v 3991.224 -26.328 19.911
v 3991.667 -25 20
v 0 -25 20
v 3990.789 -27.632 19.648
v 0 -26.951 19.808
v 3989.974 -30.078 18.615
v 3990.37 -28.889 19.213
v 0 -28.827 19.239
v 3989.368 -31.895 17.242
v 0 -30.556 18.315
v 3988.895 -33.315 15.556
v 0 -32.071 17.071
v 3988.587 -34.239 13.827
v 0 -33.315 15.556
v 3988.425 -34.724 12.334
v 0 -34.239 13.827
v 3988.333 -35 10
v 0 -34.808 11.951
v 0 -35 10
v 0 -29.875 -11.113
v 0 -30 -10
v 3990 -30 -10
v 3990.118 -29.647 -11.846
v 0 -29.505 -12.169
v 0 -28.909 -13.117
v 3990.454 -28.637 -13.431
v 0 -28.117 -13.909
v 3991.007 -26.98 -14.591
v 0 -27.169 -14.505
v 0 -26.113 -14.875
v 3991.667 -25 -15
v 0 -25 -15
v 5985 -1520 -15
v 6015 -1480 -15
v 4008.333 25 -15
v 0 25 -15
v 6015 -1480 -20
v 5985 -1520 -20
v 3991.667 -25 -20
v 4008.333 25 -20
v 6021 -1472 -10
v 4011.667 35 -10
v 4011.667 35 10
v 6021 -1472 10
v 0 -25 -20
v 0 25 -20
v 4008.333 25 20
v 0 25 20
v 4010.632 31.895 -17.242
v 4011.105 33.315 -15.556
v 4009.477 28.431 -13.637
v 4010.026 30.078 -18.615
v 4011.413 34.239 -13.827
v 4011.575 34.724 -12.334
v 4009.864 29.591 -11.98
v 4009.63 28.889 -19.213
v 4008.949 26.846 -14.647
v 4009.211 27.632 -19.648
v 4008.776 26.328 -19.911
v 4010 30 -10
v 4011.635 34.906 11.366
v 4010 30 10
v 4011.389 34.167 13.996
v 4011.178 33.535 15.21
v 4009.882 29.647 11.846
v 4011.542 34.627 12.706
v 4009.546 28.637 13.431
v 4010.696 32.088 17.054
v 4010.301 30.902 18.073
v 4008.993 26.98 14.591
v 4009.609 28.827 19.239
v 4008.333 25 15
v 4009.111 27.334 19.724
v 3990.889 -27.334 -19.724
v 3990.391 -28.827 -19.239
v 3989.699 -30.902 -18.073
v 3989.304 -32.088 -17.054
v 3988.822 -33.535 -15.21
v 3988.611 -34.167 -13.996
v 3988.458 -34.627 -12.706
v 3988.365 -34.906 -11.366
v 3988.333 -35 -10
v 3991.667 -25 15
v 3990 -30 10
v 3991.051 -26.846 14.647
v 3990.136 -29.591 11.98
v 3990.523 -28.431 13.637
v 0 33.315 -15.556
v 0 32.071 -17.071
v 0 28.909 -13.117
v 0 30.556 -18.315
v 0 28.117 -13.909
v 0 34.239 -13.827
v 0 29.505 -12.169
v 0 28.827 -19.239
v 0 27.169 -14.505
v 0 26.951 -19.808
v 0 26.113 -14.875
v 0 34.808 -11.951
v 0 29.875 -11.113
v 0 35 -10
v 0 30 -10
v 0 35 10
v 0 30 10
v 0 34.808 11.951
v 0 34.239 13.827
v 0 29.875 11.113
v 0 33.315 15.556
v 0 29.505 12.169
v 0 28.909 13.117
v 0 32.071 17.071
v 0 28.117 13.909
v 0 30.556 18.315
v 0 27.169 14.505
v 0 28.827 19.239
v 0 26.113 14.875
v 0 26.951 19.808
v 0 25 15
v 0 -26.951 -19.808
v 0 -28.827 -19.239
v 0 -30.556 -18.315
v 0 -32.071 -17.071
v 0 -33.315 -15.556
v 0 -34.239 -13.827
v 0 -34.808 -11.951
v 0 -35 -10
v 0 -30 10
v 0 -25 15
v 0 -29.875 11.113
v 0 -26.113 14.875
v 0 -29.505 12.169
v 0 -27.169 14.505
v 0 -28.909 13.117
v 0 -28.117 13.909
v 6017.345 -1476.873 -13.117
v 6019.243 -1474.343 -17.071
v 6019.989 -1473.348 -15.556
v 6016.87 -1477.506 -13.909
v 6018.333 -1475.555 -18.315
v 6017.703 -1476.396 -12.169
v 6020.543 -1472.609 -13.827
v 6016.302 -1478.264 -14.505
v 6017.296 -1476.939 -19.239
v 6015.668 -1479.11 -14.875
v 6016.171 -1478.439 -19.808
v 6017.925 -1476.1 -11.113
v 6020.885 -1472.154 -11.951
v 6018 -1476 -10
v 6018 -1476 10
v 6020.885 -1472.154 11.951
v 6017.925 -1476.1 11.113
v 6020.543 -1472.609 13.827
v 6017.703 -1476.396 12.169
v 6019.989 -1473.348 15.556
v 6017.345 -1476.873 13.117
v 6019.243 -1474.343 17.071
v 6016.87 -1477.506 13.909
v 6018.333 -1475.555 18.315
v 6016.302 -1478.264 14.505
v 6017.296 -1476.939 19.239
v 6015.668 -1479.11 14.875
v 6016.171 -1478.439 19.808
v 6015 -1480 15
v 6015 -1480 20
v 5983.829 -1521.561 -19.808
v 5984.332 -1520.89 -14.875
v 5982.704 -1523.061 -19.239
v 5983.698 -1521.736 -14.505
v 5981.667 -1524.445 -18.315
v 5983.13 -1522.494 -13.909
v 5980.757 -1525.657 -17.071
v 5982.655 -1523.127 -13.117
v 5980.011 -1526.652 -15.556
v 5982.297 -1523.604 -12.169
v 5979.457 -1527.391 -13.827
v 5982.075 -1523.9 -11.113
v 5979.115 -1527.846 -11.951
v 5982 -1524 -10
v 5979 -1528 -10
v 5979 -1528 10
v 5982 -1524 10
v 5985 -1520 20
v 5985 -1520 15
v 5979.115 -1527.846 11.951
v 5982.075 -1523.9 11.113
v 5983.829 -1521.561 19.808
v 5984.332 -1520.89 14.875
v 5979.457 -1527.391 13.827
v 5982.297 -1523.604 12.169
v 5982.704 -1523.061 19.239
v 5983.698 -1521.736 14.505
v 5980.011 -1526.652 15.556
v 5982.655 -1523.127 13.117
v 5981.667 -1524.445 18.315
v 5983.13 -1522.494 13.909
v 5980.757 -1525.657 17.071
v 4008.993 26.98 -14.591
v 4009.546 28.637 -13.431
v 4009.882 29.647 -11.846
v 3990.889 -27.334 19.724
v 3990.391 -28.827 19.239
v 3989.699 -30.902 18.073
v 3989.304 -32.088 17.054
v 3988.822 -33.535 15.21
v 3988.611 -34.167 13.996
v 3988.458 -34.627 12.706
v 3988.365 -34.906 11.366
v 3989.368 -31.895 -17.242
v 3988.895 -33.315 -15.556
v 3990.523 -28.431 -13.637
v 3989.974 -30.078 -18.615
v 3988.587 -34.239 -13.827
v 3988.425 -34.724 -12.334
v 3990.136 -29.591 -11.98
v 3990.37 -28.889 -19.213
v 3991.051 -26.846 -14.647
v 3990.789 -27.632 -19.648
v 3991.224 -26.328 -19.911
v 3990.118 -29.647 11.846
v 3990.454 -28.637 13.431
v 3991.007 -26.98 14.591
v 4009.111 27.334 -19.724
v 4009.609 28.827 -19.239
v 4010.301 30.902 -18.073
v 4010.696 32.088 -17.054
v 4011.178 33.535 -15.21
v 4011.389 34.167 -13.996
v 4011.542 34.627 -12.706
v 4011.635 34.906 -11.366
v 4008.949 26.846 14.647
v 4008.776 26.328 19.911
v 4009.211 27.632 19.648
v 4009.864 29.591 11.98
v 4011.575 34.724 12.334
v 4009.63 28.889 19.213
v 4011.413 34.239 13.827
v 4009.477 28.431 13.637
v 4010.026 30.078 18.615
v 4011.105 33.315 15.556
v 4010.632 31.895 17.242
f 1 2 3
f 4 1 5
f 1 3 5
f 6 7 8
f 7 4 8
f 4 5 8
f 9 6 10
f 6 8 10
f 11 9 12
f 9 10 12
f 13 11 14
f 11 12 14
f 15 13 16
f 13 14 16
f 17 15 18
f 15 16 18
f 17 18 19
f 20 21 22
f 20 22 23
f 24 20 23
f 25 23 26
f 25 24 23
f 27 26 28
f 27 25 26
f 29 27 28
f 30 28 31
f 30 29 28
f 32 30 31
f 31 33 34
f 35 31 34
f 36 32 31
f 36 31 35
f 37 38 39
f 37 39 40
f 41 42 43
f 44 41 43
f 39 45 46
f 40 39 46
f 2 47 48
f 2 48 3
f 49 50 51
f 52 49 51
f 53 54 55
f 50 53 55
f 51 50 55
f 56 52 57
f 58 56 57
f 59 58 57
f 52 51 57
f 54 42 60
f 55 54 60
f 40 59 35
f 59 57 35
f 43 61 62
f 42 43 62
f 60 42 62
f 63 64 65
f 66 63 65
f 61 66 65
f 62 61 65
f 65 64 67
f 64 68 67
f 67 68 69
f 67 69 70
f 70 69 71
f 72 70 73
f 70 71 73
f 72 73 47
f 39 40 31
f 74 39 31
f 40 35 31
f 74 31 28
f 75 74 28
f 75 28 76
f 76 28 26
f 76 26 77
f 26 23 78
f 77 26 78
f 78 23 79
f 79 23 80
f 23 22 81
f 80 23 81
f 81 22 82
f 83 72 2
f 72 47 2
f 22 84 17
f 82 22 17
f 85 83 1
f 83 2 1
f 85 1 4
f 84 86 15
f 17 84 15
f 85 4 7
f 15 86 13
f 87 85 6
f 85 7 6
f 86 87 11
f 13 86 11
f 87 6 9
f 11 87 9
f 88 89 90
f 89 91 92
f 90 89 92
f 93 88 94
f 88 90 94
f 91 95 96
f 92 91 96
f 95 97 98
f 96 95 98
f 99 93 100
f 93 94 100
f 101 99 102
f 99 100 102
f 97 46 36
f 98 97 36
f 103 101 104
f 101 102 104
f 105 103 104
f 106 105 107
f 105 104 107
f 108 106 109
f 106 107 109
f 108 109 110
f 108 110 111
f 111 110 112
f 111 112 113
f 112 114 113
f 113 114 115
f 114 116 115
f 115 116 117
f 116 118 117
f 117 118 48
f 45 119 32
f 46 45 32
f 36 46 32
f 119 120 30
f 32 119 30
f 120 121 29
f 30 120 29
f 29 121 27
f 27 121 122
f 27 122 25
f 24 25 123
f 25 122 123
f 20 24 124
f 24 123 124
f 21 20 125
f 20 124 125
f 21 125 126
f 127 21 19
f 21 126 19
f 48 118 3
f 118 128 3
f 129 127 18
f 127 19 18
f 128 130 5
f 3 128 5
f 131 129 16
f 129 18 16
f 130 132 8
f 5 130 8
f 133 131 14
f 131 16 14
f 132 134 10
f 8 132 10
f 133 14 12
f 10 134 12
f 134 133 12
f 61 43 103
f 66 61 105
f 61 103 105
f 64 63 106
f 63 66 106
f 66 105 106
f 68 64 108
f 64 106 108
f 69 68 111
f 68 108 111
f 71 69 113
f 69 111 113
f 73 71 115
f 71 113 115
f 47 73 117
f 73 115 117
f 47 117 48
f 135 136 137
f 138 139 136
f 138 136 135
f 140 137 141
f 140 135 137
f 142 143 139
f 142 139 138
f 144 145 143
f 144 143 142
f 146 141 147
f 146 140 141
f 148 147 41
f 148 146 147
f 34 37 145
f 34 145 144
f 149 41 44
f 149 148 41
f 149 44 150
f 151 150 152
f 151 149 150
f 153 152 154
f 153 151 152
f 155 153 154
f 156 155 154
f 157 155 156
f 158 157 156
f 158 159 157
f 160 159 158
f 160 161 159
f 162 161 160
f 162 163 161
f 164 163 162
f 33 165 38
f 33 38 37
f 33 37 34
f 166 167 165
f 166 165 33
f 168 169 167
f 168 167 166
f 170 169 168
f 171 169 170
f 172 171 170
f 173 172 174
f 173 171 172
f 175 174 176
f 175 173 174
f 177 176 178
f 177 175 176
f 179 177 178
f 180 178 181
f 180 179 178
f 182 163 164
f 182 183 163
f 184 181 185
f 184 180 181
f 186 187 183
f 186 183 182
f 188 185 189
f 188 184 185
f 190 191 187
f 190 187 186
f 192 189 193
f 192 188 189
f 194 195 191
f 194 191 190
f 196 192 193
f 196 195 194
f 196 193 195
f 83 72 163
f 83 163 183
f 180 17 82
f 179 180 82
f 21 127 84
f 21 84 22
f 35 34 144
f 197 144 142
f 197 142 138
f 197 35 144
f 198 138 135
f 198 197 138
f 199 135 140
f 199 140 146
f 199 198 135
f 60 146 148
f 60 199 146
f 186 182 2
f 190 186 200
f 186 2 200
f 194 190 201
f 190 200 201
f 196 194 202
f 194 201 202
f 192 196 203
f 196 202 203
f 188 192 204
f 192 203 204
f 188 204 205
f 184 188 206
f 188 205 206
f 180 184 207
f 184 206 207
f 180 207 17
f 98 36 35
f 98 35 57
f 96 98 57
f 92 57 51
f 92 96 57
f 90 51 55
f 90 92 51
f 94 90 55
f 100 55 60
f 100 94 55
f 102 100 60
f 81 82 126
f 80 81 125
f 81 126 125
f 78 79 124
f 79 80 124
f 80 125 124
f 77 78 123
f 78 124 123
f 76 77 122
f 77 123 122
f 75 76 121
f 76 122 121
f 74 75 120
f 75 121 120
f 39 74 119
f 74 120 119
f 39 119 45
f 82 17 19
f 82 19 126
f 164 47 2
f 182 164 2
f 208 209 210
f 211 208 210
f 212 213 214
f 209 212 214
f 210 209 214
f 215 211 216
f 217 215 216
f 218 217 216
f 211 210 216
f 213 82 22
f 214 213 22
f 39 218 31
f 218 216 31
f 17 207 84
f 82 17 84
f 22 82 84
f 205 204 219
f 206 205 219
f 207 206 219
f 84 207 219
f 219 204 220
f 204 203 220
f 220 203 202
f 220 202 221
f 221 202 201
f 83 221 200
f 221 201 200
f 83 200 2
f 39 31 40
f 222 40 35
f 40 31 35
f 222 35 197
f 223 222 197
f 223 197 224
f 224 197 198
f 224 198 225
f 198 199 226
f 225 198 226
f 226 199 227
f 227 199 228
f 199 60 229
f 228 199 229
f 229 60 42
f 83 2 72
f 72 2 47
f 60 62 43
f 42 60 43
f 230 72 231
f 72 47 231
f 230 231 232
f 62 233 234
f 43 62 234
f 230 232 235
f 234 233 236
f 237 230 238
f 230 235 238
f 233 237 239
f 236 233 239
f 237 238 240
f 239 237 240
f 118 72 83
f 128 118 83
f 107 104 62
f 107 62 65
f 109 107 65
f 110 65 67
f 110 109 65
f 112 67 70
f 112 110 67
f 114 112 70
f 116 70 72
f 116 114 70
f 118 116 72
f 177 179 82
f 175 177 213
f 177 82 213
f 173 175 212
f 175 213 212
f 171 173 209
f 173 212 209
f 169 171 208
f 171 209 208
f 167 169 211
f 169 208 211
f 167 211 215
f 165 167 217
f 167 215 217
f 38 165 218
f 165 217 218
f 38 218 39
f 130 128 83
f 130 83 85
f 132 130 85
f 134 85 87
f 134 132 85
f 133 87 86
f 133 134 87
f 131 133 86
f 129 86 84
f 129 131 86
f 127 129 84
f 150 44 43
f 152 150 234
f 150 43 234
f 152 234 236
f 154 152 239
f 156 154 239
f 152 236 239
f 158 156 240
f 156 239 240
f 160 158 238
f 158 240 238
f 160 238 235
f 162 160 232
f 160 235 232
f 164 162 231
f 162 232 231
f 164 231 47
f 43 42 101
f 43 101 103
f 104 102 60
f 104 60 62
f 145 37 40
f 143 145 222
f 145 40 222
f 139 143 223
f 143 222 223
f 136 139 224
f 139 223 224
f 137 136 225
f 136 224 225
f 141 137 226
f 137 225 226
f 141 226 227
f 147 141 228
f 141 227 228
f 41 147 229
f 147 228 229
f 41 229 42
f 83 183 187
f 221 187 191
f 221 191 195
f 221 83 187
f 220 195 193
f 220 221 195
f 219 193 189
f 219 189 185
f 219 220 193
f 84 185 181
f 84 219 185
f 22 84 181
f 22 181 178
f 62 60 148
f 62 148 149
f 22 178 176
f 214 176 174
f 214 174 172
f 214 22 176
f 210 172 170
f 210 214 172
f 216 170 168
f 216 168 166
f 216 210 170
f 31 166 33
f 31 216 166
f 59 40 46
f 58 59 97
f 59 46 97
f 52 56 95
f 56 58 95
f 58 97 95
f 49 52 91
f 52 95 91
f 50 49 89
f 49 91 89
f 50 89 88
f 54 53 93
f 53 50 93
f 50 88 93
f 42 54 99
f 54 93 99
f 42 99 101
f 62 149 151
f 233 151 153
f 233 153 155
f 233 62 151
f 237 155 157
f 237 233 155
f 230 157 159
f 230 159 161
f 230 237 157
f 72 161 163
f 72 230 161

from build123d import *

# Parameters (mm, degrees)
STRUCTURAL_MEMBER1_DEPTH   = 4014.437096247
STRUCTURAL_MEMBER1_2_DEPTH = 2514.437096247


with BuildPart() as part:
    # Sketch1 → Structural Member1 (new body)
    with BuildSketch(Plane(origin=(0, 0, 0), x_dir=(0, 0, 1), z_dir=(1, 0, 0))):
        with BuildLine():
            Line((-10, -35), (10, -35))
            ThreePointArc((10, -35), (17.071067812, -32.071067812), (20, -25))
            Line((20, -25), (20, 25))
            ThreePointArc((20, 25), (17.071067812, 32.071067812), (10, 35))
            Line((10, 35), (-10, 35))
            ThreePointArc((-10, 35), (-17.071067812, 32.071067812), (-20, 25))
            Line((-20, 25), (-20, -25))
            ThreePointArc((-20, -25), (-17.071067812, -32.071067812), (-10, -35))
        make_face()
        with BuildLine():
            Line((-10, -30), (10, -30))
            ThreePointArc((10, -30), (13.535533906, -28.535533906), (15, -25))
            Line((15, -25), (15, 25))
            ThreePointArc((15, 25), (13.535533906, 28.535533906), (10, 30))
            Line((10, 30), (-10, 30))
            ThreePointArc((-10, 30), (-13.535533906, 28.535533906), (-15, 25))
            Line((-15, 25), (-15, -25))
            ThreePointArc((-15, -25), (-13.535533906, -28.535533906), (-10, -30))
        make_face(mode=Mode.SUBTRACT)
    extrude(amount=STRUCTURAL_MEMBER1_DEPTH)

    # Structural Member1 mitre 1
    split(bisect_by=Plane(origin=(4000, 0, 0), x_dir=(-0.316227766, -0.948683298, 0), z_dir=(-0.948683298, 0.316227766, 0)), keep=Keep.TOP)


with BuildPart() as body_2:
    # Sketch1 on segment 2 (carried to segment 2) → Structural Member1 2 (new body)
    with BuildSketch(Plane(origin=(3988.450323002, 8.662257748, 0), x_dir=(0, 0, 1), z_dir=(0.8, -0.6, 0))):
        with BuildLine():
            Line((-10, -35), (10, -35))
            ThreePointArc((10, -35), (17.071067812, -32.071067812), (20, -25))
            Line((20, -25), (20, 25))
            ThreePointArc((20, 25), (17.071067812, 32.071067812), (10, 35))
            Line((10, 35), (-10, 35))
            ThreePointArc((-10, 35), (-17.071067812, 32.071067812), (-20, 25))
            Line((-20, 25), (-20, -25))
            ThreePointArc((-20, -25), (-17.071067812, -32.071067812), (-10, -35))
        make_face()
        with BuildLine():
            Line((-10, -30), (10, -30))
            ThreePointArc((10, -30), (13.535533906, -28.535533906), (15, -25))
            Line((15, -25), (15, 25))
            ThreePointArc((15, 25), (13.535533906, 28.535533906), (10, 30))
            Line((10, 30), (-10, 30))
            ThreePointArc((-10, 30), (-13.535533906, 28.535533906), (-15, 25))
            Line((-15, 25), (-15, -25))
            ThreePointArc((-15, -25), (-13.535533906, -28.535533906), (-10, -30))
        make_face(mode=Mode.SUBTRACT)
    extrude(amount=STRUCTURAL_MEMBER1_2_DEPTH)

    # Structural Member1 2 mitre 1
    split(bisect_by=Plane(origin=(4000, 0, 0), x_dir=(0.316227766, 0.948683298, 0), z_dir=(0.948683298, -0.316227766, 0)), keep=Keep.TOP)


solid = Compound([part.part, body_2.part])
